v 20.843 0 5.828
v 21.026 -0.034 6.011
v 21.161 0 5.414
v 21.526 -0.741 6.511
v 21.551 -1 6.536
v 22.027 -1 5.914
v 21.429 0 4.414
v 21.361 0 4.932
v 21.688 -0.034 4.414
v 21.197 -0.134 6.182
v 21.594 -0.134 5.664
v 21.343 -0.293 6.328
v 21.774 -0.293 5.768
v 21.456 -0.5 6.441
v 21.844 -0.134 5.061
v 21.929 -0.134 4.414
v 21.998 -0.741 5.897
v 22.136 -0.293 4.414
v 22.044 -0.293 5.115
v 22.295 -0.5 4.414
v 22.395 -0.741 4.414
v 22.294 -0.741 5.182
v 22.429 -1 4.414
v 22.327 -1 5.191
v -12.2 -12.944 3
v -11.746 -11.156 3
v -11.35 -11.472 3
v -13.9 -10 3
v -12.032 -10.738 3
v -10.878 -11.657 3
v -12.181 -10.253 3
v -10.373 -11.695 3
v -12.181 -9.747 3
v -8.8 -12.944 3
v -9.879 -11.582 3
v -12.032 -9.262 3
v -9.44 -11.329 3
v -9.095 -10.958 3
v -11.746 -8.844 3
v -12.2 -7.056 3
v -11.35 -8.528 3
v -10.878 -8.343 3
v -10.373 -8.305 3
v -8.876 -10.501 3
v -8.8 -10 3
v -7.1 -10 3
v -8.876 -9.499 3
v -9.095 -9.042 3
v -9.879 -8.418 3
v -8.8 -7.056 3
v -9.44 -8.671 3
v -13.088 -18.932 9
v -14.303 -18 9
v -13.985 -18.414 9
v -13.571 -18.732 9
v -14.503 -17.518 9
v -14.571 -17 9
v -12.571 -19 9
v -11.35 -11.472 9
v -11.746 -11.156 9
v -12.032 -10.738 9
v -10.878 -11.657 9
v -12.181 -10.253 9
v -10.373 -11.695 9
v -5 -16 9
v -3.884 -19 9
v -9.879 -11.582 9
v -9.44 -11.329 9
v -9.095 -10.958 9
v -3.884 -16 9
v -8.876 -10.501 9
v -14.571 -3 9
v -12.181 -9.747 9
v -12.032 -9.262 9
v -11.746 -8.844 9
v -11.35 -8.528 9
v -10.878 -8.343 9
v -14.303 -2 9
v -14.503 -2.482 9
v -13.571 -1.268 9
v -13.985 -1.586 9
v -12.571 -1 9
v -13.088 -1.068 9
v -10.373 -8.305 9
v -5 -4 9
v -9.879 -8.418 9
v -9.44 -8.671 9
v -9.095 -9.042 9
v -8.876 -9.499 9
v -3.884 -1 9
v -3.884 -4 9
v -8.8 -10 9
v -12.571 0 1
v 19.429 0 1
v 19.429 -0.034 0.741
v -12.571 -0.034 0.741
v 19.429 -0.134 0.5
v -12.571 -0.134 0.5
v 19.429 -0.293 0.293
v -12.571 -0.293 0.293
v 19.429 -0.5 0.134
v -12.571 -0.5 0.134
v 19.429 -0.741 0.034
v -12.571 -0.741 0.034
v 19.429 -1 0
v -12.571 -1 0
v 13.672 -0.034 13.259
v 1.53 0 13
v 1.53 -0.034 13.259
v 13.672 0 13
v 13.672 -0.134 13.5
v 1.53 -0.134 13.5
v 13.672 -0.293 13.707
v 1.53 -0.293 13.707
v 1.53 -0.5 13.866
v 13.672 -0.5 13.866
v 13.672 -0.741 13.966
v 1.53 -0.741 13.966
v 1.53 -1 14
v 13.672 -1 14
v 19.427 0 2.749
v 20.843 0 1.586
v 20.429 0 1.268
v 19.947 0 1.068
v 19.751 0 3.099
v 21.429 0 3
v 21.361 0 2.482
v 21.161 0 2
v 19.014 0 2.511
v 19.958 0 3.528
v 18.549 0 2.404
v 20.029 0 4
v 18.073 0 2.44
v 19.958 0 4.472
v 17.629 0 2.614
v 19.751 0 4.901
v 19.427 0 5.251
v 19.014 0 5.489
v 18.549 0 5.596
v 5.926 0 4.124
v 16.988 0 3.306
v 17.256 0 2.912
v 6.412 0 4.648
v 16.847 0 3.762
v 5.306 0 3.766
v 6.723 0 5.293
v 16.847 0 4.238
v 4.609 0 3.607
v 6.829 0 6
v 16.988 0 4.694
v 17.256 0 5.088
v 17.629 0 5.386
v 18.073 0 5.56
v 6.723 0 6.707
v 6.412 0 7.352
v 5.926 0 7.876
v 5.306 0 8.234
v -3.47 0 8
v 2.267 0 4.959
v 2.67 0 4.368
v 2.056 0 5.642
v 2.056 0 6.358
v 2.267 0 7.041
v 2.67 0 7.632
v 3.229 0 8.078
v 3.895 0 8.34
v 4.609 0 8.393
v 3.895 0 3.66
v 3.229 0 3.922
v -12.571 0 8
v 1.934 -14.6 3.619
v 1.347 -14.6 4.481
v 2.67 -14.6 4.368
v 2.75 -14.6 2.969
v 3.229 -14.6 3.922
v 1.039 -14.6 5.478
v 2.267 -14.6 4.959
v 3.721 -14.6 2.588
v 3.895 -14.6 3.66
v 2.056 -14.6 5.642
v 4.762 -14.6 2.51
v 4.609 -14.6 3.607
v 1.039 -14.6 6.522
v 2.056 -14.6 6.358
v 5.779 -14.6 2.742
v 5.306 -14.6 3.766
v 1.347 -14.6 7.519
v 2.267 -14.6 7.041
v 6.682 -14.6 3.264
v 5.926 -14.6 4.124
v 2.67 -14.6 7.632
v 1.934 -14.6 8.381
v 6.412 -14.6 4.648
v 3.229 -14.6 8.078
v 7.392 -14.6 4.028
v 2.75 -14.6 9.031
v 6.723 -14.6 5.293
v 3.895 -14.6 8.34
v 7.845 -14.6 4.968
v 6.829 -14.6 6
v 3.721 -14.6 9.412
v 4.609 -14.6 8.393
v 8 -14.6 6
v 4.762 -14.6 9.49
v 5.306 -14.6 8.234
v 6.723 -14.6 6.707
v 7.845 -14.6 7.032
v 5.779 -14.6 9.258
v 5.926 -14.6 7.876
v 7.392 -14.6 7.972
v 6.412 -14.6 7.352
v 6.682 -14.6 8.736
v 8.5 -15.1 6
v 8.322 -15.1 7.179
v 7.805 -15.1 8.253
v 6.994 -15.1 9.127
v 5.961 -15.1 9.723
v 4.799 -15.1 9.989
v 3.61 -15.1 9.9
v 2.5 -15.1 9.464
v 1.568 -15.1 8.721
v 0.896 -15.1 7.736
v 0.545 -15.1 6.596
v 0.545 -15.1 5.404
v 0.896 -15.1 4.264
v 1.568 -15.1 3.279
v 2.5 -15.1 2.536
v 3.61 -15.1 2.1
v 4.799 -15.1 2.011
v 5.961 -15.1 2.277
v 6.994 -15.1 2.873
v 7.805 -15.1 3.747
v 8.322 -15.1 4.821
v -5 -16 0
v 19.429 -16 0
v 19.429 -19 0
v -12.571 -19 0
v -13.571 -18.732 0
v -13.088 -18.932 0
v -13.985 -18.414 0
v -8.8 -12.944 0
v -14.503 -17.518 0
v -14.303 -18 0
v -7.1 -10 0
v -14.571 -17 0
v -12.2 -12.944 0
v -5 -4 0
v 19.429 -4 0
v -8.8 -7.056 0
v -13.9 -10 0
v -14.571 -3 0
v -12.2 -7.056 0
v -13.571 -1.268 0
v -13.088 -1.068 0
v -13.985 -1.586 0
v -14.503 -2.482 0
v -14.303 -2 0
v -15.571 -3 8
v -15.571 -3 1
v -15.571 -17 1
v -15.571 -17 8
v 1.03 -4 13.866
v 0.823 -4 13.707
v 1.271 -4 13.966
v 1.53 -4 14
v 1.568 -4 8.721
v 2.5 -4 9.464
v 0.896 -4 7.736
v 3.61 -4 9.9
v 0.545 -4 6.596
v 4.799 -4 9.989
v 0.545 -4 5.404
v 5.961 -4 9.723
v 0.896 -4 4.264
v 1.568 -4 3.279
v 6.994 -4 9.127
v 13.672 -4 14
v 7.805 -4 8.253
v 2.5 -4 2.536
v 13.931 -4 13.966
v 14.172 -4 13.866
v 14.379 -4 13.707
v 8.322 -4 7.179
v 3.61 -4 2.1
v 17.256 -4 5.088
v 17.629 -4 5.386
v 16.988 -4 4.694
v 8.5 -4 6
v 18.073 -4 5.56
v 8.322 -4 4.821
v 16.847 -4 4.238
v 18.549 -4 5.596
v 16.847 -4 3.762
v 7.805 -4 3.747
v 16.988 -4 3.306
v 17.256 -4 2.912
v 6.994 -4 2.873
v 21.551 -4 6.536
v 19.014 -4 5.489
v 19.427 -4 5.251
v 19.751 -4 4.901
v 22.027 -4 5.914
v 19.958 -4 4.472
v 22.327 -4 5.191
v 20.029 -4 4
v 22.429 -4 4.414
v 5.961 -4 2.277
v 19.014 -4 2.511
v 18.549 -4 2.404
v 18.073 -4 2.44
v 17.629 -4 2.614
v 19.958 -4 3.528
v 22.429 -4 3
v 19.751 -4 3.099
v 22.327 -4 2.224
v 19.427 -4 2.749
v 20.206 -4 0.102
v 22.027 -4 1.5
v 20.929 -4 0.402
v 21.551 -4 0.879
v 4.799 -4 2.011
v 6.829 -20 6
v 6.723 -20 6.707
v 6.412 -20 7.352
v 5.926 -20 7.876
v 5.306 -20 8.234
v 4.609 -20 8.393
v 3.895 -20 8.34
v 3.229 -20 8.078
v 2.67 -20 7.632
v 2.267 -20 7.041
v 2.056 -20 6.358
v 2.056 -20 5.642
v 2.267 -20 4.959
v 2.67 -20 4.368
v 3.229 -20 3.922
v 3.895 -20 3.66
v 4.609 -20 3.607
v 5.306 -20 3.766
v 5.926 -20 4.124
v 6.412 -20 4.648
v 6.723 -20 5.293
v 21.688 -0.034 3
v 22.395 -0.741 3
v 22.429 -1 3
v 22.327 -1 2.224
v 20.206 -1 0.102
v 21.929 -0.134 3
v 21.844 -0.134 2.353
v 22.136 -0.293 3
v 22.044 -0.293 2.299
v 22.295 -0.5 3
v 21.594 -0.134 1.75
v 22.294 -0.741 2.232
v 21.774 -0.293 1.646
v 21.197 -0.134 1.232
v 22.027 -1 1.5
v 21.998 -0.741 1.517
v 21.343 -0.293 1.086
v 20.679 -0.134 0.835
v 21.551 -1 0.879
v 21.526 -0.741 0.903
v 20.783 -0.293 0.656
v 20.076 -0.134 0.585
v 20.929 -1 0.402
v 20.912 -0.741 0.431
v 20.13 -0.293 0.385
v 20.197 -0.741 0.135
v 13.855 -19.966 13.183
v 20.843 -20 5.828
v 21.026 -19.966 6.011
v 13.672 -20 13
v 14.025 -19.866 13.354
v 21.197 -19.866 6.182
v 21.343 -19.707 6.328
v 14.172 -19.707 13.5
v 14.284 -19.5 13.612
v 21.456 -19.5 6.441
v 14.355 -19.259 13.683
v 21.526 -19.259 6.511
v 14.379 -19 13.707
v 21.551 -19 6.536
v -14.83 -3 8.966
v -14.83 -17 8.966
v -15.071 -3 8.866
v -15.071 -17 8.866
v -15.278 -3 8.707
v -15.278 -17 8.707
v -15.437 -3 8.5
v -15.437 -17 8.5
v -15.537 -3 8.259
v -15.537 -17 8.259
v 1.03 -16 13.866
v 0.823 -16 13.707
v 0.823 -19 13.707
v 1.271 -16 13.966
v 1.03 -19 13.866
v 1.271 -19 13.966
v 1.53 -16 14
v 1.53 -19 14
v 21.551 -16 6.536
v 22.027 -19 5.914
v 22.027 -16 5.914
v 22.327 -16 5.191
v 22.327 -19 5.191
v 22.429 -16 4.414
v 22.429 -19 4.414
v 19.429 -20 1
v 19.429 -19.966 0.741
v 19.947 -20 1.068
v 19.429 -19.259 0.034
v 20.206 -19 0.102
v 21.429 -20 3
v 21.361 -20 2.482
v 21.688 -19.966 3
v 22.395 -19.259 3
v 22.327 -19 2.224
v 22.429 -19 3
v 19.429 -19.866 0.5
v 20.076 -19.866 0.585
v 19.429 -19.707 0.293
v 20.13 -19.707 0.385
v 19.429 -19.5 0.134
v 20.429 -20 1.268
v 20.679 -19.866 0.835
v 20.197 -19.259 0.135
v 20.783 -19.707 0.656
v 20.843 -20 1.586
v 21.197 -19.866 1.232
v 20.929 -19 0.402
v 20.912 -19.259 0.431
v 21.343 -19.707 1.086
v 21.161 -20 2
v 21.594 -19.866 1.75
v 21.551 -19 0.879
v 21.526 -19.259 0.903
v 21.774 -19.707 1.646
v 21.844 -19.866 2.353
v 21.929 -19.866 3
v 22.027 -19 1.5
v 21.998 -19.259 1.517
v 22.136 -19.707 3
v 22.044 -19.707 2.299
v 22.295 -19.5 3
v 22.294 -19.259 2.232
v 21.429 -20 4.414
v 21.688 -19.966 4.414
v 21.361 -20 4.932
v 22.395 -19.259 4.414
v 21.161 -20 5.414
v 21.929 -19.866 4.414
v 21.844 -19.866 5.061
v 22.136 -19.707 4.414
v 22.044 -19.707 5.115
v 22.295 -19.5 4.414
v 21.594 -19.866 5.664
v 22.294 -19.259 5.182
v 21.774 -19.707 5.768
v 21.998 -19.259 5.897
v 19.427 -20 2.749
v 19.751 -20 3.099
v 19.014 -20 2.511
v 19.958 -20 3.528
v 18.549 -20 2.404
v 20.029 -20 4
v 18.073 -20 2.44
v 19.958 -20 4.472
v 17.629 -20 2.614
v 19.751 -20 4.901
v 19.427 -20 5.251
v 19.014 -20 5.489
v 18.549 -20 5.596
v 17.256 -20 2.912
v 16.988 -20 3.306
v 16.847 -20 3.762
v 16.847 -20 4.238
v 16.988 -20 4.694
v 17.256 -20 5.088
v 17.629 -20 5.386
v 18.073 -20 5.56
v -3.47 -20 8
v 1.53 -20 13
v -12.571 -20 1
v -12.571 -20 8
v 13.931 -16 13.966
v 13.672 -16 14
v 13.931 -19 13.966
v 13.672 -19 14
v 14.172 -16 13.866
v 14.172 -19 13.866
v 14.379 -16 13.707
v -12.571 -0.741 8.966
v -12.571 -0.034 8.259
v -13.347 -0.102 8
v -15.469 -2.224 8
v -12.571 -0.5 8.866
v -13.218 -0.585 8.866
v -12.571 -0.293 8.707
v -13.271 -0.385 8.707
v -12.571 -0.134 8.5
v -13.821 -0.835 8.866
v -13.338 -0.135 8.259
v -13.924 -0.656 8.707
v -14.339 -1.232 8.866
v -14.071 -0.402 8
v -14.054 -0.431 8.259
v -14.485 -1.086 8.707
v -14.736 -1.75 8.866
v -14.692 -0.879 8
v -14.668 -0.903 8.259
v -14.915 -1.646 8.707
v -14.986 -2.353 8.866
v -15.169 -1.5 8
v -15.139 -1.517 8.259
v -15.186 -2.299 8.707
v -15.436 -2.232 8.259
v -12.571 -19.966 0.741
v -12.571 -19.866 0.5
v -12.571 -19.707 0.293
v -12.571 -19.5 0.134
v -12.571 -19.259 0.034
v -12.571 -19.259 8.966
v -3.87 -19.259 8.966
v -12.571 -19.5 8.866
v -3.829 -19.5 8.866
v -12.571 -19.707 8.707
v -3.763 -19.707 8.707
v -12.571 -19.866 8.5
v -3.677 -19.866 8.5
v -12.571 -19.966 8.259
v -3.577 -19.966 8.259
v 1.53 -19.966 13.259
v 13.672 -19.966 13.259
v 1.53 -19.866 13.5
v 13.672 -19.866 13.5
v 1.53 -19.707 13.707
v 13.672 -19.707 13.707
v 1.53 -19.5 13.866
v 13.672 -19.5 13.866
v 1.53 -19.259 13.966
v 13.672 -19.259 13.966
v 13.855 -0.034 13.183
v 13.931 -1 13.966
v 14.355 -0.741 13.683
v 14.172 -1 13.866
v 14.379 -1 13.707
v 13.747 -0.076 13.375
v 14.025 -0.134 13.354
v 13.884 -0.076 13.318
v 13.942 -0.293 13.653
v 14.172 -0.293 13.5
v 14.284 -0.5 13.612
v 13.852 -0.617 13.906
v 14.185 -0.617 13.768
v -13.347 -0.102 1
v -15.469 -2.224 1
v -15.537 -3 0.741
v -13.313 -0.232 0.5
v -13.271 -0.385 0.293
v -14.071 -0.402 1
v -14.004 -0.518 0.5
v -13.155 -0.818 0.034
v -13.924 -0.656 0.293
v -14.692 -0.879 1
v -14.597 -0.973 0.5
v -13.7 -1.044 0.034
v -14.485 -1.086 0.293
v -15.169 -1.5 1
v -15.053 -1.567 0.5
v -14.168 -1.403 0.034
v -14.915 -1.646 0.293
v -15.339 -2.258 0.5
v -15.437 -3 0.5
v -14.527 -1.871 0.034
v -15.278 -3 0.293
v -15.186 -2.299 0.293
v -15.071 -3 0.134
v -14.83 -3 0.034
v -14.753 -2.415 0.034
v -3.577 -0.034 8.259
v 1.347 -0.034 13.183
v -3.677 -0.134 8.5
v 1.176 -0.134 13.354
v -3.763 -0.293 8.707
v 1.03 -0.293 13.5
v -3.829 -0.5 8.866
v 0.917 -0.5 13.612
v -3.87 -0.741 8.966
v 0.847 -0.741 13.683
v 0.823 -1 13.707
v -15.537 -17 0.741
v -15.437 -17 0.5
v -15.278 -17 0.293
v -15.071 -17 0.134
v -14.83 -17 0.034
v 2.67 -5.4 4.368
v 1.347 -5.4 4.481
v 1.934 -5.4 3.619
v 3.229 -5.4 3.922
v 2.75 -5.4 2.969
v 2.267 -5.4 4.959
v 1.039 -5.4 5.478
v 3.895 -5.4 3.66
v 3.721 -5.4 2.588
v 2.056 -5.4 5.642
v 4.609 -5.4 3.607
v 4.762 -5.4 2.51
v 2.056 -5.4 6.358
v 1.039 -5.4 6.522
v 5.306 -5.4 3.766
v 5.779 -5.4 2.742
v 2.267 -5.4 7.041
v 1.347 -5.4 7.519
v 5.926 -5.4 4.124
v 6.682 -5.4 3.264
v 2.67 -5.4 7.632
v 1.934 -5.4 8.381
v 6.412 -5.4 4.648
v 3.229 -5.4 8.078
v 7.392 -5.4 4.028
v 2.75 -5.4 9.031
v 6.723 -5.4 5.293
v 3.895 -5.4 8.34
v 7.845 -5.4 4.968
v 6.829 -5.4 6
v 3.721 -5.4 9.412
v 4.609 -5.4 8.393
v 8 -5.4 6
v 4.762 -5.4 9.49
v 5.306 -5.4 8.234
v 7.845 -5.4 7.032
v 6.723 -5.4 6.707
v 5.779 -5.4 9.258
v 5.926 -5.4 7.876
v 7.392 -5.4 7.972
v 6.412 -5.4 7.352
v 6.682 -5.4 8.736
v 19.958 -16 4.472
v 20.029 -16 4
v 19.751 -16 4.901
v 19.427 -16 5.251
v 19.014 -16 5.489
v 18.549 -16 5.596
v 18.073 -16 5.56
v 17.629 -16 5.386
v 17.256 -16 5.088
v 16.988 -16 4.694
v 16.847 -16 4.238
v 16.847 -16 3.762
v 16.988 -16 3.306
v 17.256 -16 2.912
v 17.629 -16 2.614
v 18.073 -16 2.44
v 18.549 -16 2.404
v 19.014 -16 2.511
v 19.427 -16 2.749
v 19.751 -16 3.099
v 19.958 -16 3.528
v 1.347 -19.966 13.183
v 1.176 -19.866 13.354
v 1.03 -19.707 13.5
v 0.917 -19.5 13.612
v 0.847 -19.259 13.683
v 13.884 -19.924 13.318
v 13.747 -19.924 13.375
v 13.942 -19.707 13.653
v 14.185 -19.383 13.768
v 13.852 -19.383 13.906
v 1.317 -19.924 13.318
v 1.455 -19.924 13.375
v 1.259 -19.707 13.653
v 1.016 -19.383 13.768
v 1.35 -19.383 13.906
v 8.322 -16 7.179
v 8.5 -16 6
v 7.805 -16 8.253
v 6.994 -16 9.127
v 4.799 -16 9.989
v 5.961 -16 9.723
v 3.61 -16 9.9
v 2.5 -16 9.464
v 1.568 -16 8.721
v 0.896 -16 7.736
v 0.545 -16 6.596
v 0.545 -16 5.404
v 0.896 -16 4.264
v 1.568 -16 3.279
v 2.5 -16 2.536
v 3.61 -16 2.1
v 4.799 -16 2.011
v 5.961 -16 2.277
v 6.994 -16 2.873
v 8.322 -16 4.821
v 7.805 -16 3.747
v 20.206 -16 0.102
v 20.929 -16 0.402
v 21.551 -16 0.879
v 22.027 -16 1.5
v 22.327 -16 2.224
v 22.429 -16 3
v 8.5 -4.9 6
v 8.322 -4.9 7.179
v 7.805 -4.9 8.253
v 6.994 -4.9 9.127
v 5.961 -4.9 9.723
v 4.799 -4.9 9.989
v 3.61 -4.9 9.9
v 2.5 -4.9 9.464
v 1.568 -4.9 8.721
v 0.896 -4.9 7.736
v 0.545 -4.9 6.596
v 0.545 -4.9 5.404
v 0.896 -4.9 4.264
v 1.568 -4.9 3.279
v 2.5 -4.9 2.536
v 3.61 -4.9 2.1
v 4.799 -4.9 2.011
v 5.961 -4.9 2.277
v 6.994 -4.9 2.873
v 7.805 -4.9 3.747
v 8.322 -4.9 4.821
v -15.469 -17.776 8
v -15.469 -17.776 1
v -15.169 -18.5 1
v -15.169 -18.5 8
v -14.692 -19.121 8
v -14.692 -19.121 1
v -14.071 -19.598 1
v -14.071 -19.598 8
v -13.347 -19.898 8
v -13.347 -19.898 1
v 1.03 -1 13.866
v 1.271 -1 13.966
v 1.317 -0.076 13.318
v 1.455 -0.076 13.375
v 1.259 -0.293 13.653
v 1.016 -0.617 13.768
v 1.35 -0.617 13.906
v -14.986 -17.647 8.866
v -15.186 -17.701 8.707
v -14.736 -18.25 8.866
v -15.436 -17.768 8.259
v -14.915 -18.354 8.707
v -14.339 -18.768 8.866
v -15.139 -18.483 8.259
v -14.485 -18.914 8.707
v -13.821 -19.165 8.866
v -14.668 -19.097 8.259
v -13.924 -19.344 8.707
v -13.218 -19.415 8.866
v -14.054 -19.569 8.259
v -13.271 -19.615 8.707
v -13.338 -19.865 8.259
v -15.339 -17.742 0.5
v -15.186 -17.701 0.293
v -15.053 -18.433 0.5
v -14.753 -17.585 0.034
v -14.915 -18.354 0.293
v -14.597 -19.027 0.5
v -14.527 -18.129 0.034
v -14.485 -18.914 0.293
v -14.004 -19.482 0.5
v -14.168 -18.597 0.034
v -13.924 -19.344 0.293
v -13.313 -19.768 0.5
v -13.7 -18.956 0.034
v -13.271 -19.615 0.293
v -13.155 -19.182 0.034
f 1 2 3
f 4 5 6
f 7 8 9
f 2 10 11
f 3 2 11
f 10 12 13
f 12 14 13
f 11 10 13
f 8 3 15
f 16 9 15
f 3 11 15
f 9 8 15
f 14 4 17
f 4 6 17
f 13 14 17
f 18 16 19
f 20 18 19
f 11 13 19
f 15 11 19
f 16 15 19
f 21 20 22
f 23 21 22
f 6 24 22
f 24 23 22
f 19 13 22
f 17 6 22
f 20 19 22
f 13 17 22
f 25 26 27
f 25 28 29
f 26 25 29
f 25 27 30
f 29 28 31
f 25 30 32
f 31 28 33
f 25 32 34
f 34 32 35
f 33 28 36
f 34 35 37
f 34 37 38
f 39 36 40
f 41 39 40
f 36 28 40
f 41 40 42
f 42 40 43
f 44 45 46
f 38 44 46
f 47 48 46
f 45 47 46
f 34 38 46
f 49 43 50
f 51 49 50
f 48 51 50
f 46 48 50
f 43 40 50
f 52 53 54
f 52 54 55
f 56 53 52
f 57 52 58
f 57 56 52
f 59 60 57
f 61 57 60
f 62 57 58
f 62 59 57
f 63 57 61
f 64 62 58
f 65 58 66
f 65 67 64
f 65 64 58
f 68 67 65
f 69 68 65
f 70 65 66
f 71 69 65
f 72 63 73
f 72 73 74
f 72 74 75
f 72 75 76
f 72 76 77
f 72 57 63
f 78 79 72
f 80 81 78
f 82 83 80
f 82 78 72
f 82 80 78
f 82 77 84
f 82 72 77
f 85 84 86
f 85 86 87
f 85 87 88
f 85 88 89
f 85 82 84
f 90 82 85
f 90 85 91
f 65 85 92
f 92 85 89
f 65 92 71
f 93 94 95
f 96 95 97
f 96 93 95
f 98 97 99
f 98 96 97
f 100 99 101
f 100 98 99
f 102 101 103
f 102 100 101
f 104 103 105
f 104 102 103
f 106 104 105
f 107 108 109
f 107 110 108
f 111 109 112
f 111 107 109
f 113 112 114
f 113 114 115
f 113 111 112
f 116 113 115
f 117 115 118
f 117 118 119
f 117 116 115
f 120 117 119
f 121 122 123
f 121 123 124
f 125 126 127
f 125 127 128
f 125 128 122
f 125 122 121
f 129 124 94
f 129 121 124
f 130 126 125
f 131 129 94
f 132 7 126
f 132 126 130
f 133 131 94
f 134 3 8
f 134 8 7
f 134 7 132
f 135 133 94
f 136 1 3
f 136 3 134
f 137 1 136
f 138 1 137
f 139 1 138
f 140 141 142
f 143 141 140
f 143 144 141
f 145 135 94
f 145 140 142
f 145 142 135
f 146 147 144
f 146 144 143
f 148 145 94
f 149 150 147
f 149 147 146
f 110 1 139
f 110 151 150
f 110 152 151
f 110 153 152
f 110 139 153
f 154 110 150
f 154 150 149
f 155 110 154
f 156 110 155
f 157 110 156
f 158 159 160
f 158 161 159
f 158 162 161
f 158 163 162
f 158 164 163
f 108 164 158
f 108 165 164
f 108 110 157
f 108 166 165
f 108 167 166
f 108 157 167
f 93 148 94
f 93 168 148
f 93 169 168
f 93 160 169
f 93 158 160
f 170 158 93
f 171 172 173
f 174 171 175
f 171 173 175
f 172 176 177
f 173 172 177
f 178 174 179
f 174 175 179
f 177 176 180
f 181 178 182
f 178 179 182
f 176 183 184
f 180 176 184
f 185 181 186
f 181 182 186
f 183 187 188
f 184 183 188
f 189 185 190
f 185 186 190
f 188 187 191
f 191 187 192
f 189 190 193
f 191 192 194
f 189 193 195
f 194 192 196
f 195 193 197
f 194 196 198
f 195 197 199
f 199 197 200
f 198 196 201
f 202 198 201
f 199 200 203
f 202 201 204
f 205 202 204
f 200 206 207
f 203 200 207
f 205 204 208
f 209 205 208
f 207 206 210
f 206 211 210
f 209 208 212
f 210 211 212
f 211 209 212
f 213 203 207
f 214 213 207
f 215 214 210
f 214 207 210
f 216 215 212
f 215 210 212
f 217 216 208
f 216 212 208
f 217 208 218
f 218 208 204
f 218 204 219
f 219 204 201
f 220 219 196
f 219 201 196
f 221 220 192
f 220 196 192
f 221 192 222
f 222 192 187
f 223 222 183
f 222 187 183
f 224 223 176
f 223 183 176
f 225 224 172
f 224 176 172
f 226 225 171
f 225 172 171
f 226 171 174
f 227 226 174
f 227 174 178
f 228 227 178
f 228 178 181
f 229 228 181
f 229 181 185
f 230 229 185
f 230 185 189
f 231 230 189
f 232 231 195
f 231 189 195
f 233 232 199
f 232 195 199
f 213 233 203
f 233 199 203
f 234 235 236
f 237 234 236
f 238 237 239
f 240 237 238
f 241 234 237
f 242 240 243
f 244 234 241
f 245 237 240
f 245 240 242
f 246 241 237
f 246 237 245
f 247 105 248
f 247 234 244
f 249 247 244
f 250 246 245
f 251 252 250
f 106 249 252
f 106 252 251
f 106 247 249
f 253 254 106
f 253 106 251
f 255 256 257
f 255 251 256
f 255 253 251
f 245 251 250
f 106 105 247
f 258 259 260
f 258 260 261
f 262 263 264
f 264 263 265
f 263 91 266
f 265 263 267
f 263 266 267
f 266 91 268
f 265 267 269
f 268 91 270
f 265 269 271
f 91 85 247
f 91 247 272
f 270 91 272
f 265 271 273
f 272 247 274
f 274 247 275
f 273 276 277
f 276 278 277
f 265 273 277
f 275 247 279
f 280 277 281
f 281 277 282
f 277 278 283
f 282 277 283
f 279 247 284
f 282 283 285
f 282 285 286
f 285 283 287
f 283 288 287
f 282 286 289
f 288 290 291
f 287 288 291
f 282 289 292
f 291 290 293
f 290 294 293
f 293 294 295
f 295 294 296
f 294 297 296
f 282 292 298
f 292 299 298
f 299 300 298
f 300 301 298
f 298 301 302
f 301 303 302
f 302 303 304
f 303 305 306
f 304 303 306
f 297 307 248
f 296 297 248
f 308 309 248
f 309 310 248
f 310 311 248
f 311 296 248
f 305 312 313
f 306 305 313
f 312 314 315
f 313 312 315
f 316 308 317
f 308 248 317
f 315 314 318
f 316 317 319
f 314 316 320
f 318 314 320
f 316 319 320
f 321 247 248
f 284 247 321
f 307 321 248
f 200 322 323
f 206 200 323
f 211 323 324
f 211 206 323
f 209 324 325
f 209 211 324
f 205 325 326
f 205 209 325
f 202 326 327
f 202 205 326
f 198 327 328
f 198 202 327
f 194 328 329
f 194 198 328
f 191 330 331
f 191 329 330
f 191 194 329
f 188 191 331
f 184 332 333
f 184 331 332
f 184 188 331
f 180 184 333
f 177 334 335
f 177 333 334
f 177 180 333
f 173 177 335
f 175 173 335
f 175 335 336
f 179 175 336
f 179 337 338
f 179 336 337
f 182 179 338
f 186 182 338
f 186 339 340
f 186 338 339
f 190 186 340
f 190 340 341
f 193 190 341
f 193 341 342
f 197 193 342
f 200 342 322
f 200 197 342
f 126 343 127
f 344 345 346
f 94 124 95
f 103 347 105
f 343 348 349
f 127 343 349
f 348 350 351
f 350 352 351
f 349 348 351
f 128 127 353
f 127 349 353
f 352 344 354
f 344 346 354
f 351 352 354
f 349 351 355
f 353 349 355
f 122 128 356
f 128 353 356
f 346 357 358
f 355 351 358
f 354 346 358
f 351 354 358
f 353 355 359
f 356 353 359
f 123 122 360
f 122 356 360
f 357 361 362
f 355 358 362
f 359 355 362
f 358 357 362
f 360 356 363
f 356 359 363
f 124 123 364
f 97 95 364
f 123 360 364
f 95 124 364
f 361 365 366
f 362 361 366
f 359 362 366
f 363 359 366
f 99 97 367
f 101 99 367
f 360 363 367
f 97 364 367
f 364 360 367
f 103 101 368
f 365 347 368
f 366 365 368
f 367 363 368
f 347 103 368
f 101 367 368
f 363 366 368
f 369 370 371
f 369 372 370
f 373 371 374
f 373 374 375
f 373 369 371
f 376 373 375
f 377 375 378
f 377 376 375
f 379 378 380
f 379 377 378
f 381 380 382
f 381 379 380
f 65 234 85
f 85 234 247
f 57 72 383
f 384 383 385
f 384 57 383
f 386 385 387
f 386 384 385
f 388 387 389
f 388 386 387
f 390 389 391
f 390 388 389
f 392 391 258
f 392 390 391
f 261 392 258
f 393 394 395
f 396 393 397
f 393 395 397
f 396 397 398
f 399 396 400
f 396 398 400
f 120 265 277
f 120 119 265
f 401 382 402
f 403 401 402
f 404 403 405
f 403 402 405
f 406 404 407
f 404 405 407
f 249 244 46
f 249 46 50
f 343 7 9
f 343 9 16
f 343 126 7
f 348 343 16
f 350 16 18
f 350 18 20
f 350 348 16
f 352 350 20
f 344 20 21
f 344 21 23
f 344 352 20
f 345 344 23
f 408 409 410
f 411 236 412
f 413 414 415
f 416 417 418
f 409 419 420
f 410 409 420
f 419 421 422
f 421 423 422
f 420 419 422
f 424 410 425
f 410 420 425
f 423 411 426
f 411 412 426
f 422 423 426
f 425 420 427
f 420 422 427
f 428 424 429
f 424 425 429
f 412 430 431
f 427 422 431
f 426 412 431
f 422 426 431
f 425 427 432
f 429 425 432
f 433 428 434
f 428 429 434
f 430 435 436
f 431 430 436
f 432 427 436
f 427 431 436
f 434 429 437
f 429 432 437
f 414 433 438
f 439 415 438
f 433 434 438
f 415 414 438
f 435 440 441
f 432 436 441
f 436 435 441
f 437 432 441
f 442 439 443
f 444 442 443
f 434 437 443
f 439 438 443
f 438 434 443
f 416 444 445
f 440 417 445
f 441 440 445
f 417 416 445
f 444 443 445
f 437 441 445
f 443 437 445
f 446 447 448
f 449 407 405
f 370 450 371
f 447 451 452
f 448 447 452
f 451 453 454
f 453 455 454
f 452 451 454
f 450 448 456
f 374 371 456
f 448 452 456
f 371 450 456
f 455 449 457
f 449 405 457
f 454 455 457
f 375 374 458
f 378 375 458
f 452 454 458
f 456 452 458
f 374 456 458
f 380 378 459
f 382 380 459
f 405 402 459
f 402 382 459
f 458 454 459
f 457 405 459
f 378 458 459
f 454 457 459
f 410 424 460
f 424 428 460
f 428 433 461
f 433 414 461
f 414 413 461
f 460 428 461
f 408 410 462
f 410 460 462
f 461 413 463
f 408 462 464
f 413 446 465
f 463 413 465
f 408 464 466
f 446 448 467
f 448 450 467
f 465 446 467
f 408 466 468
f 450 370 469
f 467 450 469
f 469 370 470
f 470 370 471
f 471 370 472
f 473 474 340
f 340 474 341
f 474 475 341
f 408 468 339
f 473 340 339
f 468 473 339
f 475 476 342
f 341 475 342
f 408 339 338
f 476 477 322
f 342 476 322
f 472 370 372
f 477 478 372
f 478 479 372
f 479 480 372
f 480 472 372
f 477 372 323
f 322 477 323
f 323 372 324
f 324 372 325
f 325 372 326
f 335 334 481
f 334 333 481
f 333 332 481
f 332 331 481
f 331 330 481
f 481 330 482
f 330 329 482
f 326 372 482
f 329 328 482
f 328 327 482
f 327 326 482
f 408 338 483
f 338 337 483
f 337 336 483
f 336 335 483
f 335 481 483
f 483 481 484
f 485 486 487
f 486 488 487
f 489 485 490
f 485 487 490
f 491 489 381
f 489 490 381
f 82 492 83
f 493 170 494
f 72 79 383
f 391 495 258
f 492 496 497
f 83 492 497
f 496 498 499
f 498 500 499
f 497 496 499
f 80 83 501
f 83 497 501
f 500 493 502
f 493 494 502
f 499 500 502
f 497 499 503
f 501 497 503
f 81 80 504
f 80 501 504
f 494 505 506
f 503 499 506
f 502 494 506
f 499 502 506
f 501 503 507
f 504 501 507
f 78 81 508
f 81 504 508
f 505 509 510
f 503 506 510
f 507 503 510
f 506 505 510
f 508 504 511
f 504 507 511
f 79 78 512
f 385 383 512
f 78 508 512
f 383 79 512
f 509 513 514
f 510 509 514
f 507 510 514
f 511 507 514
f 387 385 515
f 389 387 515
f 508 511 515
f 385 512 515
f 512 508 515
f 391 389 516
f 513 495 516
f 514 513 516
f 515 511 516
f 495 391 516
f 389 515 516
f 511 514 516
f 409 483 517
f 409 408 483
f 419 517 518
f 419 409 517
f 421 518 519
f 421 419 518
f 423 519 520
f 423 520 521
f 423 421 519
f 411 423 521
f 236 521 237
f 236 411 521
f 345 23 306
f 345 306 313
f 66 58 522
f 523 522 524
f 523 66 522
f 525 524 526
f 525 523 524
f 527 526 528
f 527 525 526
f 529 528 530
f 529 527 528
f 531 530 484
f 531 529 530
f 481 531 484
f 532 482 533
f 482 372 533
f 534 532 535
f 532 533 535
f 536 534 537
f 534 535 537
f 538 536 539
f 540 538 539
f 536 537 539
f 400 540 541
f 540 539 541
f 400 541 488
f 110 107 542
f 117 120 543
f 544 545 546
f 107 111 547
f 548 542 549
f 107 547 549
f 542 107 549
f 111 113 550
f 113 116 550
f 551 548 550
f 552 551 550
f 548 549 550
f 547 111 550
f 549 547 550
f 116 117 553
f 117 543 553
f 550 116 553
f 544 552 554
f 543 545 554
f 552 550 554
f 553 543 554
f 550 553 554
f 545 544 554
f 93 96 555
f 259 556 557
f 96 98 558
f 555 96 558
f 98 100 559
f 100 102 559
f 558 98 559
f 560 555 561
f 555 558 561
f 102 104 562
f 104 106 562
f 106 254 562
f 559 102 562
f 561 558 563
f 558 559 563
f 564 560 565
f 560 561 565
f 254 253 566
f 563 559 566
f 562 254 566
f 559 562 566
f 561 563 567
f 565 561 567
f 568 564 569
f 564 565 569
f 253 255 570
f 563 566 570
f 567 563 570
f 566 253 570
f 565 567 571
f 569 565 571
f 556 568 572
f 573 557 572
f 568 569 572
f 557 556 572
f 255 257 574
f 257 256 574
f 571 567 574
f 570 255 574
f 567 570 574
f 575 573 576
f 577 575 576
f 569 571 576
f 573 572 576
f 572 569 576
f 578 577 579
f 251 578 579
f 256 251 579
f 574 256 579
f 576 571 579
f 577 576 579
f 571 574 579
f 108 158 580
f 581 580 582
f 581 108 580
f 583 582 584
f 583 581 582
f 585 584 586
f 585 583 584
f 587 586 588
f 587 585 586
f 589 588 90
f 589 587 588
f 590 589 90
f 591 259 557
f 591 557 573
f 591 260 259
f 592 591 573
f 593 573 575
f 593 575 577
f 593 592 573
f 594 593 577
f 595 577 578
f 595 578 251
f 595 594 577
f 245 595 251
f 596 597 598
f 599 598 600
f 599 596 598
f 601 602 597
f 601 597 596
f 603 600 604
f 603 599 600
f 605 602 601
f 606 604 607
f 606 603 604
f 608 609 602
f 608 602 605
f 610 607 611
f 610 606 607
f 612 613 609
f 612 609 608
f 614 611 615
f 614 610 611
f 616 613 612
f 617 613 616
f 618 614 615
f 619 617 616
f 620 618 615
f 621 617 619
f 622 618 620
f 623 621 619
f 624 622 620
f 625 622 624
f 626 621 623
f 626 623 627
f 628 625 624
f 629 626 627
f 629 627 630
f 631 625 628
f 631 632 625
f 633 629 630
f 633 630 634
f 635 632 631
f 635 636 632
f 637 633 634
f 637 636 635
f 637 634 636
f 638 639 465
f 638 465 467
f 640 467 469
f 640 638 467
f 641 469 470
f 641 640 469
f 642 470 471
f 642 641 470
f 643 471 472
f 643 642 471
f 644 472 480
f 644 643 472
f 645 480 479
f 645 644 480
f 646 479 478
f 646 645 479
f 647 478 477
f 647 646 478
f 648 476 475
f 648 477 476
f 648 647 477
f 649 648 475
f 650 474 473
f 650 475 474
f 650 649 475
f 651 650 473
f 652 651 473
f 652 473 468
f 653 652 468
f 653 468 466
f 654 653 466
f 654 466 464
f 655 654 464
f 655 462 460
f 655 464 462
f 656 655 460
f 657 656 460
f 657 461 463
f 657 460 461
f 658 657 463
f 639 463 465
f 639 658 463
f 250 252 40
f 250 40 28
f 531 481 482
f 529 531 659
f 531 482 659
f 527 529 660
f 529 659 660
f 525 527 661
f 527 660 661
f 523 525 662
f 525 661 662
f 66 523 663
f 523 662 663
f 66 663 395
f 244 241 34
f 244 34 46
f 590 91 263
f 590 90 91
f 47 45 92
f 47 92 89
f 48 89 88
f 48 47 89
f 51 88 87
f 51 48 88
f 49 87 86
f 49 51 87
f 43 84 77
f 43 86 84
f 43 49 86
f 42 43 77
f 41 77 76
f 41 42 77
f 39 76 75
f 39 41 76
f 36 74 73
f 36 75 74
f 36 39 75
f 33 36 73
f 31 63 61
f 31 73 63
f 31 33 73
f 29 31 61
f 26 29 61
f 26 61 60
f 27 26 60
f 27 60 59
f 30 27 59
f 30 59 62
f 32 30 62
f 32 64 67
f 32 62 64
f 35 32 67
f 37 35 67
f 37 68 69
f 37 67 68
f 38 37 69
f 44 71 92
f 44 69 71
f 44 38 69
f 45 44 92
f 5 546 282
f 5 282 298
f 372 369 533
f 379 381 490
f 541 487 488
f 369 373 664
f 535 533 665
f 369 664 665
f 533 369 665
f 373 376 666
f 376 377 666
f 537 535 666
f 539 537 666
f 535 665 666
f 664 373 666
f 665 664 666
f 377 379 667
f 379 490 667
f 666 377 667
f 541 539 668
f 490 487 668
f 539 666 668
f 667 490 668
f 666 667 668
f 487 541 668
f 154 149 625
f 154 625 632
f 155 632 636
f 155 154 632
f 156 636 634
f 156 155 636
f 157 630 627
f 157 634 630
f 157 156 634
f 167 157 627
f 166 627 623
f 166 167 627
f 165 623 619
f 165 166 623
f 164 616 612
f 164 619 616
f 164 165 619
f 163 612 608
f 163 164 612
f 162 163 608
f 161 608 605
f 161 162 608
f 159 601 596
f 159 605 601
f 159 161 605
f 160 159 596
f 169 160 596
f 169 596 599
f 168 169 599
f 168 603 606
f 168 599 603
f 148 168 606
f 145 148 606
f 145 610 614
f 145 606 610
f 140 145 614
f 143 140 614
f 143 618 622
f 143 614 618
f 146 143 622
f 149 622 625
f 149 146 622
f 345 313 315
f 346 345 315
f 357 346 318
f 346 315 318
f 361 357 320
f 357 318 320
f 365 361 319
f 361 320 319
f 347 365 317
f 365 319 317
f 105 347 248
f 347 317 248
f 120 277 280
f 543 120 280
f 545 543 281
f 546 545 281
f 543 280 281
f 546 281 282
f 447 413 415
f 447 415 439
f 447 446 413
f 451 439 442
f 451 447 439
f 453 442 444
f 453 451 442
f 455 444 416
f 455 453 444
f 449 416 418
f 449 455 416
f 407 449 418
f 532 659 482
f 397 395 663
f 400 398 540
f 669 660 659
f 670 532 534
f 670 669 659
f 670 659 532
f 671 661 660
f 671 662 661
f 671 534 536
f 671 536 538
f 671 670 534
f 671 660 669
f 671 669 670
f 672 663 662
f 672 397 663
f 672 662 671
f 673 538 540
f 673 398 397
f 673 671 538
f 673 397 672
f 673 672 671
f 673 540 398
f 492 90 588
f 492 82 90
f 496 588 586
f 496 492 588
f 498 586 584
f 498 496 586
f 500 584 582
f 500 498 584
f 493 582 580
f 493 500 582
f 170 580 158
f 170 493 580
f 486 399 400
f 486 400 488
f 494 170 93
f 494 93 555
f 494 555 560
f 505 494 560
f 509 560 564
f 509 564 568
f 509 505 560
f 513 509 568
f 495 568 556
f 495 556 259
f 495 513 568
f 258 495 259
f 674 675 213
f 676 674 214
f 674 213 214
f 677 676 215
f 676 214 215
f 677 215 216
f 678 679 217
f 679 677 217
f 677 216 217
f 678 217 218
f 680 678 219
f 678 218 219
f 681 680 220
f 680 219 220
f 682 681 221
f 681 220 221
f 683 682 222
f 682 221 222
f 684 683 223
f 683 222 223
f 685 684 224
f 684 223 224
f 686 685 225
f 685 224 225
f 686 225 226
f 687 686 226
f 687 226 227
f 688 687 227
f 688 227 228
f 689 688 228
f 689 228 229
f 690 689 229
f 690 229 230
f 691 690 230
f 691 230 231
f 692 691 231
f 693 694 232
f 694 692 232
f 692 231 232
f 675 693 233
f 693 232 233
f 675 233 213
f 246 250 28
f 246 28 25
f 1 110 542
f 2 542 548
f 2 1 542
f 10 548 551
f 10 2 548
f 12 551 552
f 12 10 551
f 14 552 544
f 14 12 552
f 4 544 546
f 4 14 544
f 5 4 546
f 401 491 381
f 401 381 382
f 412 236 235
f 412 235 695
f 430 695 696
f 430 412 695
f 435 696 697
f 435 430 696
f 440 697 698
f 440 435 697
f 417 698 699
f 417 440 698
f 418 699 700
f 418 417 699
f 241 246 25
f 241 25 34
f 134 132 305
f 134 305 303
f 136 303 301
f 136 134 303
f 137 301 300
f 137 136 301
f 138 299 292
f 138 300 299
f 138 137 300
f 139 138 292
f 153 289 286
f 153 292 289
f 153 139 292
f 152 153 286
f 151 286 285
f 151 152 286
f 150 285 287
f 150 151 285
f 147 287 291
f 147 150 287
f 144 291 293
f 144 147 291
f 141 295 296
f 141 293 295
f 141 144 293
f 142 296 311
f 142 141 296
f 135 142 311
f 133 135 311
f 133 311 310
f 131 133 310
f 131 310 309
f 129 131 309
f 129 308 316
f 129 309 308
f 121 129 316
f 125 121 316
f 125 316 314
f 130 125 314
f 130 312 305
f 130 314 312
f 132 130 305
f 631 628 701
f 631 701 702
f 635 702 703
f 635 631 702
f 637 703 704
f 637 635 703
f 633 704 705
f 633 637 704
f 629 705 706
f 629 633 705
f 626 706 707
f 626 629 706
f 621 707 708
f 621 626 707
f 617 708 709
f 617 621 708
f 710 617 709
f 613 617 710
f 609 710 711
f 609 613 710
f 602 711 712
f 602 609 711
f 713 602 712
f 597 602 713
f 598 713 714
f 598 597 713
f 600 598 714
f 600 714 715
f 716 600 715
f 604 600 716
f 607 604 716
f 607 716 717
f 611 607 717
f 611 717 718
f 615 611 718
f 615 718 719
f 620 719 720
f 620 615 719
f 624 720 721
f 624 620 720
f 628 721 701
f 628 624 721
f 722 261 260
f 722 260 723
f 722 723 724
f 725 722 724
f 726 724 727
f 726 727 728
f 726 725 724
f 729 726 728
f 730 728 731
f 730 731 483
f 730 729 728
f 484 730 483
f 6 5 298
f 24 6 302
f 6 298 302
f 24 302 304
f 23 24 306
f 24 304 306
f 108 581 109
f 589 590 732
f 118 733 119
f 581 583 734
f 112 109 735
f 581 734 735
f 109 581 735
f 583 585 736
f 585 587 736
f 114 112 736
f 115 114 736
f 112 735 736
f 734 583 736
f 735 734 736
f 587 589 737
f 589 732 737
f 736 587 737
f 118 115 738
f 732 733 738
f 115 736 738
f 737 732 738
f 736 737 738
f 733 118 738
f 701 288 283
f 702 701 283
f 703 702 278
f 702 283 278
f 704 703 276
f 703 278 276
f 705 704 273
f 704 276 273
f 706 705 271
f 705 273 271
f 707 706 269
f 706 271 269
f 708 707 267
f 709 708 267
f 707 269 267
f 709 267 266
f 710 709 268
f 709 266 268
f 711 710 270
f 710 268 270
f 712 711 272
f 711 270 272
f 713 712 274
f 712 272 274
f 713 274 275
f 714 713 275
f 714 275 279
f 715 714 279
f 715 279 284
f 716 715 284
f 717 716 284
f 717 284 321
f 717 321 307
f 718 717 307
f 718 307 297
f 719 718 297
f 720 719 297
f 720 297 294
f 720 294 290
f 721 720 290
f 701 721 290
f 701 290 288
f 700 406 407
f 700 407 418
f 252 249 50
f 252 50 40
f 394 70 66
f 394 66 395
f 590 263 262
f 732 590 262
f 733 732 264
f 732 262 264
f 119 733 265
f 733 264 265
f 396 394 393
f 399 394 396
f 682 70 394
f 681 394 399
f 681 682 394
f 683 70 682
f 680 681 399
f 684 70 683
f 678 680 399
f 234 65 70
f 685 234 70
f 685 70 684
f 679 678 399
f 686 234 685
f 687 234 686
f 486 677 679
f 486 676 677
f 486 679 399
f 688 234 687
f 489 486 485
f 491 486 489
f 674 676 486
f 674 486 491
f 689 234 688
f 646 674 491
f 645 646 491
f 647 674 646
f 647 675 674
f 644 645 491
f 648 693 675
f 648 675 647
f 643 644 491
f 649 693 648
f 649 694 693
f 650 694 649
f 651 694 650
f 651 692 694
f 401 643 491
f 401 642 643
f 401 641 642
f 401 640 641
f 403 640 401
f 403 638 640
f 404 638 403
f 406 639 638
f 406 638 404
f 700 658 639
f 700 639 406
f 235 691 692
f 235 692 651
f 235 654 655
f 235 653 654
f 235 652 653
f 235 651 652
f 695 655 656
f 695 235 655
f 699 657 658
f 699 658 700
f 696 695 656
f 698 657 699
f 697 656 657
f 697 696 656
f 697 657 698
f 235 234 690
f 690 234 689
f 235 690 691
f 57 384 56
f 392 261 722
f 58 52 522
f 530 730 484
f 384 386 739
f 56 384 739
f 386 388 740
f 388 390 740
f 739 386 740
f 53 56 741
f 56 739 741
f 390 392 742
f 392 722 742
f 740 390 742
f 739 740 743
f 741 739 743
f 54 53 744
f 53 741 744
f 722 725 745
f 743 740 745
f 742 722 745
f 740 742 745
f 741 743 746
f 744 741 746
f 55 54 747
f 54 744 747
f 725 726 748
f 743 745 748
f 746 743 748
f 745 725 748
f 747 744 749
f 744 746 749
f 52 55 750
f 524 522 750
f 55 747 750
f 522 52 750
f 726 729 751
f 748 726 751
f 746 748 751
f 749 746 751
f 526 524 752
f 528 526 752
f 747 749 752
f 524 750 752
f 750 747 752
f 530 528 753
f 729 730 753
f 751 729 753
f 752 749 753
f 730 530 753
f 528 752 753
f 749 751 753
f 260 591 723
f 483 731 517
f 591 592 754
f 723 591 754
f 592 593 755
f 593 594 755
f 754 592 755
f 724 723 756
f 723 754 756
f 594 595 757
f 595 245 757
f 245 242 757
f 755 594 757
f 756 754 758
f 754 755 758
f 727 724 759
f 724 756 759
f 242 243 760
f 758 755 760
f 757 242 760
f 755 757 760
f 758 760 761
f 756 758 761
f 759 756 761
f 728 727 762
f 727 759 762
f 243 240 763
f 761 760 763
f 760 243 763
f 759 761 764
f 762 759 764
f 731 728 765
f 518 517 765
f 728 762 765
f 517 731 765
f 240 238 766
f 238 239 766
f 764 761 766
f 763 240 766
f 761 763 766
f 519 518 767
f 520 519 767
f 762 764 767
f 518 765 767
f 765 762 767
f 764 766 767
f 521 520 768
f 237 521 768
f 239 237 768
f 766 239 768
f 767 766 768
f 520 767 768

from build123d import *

# Parameters (mm, degrees)
SKETCH012_R            = 2.4
SKETCH012_R_2          = 1.6
PAD010_DEPTH           = 30
CYLINDER005_R          = 4
CYLINDER005_DEPTH      = 5
CYLINDER005_ROLL_ANGLE = 90
CYLINDER004_R          = 4
CYLINDER004_DEPTH      = 5
CYLINDER004_ROLL_ANGLE = 90
CHAMFER_SIZE           = 0.5
CYLINDER003_R          = 1.7
CYLINDER003_DEPTH      = 15
PRISM_DEPTH            = 10
BOX013_W               = 30
BOX013_H               = 12
BOX013_DEPTH           = 20
PAD009_DEPTH           = 20
FILLET015_R            = 3
FILLET016_R            = 1


with BuildPart() as pad010:
    # Sketch012 → Pad010 (new body)
    with BuildSketch(Plane.XZ.offset(-5)):
        with Locations((4.42924, 6)):
            Circle(SKETCH012_R)
        with Locations((18.42924, 4)):
            Circle(SKETCH012_R_2)
    extrude(amount=PAD010_DEPTH)


with BuildPart() as cylinder005:
    # Cylinder005 → Cylinder005 (new body)
    with BuildSketch(Plane.XY):
        Circle(CYLINDER005_R)
    extrude(amount=CYLINDER005_DEPTH)


with BuildPart() as cylinder005_1:
    # Cylinder005 roll: moved
    add(cylinder005.part.rotate(Axis((0, 0, 0), (1, 0, 0)), CYLINDER005_ROLL_ANGLE))


with BuildPart() as cylinder005_2:
    # Cylinder005 placement: moved
    add(cylinder005_1.part.moved(Location((4.5, -14.6, 6))))


with BuildPart() as chamfer_body:
    # Cylinder004 → Cylinder004 (new body)
    with BuildSketch(Plane.XY):
        Circle(CYLINDER004_R)
    extrude(amount=CYLINDER004_DEPTH)


with BuildPart() as chamfer_body_1:
    # Cylinder004 roll: moved
    add(chamfer_body.part.rotate(Axis((0, 0, 0), (1, 0, 0)), CYLINDER004_ROLL_ANGLE))


with BuildPart() as chamfer_body_2:
    # Cylinder004 placement: moved
    add(chamfer_body_1.part.moved(Location((4.5, -0.4, 6))))

    # Fusion006: union Cylinder005
    add(cylinder005_2.part)

    # Chamfer
    chamfer_edges = [chamfer_body_2.edges().sort_by_distance(p)[0] for p in [
        (0.5, -5.4, 6),
        (0.5, -14.6, 6),
    ]]
    chamfer(chamfer_edges, length=CHAMFER_SIZE)


with BuildPart() as cylinder003:
    # Cylinder003 → Cylinder003 (new body)
    with BuildSketch(Plane(origin=(-10.5, -10, -2), x_dir=(1, 0, 0), z_dir=(0, 0, 1))):
        Circle(CYLINDER003_R)
    extrude(amount=CYLINDER003_DEPTH)


with BuildPart() as prism:
    # Prism → Prism (new body)
    with BuildSketch(Plane(origin=(-10.5, -10, -7), x_dir=(1, 0, 0), z_dir=(0, 0, 1))):
        Polygon((3.4, 0), (1.7, 2.944486), (-1.7, 2.944486), (-3.4, 0), (-1.7, -2.944486), (1.7, -2.944486), align=None)
    extrude(amount=PRISM_DEPTH)


with BuildPart() as cube013:
    # Box013 → Box013 (new body)
    with BuildSketch(Plane(origin=(-5, -16, -2), x_dir=(1, 0, 0), z_dir=(0, 0, 1))):
        with Locations((15, 6)):
            Rectangle(BOX013_W, BOX013_H)
    extrude(amount=BOX013_DEPTH)


with BuildPart() as cut021:
    # Sketch011 → Pad009 (new body)
    with BuildSketch(Plane.XZ):
        Polygon((-15.57076, 9), (-3.884468, 9), (1.115532, 14), (14.086094, 14), (22.42924, 5.656854), (22.42924, 0), (-15.57076, 0), align=None)
    extrude(amount=PAD009_DEPTH)

    # Cut018: cut Cube013
    add(cube013.part, mode=Mode.SUBTRACT)

    # Cut019: cut Prism
    add(prism.part, mode=Mode.SUBTRACT)

    # Cut020: cut Cylinder003
    add(cylinder003.part, mode=Mode.SUBTRACT)

    # Fillet015
    fillet015_edges = [cut021.edges().sort_by_distance(p)[0] for p in [
        (-15.57076, 0, 4.5),
        (-15.57076, -20, 4.5),
        (22.42924, -2, 5.656854),
        (22.42924, -2, 0),
        (22.42924, -18, 0),
        (22.42924, -18, 5.656854),
    ]]
    fillet(fillet015_edges, radius=FILLET015_R)

    # Fillet016
    fillet016_edges = [cut021.edges().sort_by_distance(p)[0] for p in [
        (-14.69208, -19.12132, 9),
        (-8.227614, -20, 9),
        (-1.384468, 0, 11.5),
        (7.600813, 0, 14),
        (17.818327, 0, 10.267767),
        (1.115532, -2, 14),
        (-1.384468, -20, 11.5),
        (7.600813, -20, 14),
        (17.818327, -20, 10.267767),
        (1.115532, -18, 14),
        (14.086094, -2, 14),
        (14.086094, -18, 14),
    ]]
    fillet(fillet016_edges, radius=FILLET016_R)

    # Fusion007: union Chamfer body
    add(chamfer_body_2.part)

    # Cut021: cut Pad010
    add(pad010.part, mode=Mode.SUBTRACT)


solid = cut021.part
